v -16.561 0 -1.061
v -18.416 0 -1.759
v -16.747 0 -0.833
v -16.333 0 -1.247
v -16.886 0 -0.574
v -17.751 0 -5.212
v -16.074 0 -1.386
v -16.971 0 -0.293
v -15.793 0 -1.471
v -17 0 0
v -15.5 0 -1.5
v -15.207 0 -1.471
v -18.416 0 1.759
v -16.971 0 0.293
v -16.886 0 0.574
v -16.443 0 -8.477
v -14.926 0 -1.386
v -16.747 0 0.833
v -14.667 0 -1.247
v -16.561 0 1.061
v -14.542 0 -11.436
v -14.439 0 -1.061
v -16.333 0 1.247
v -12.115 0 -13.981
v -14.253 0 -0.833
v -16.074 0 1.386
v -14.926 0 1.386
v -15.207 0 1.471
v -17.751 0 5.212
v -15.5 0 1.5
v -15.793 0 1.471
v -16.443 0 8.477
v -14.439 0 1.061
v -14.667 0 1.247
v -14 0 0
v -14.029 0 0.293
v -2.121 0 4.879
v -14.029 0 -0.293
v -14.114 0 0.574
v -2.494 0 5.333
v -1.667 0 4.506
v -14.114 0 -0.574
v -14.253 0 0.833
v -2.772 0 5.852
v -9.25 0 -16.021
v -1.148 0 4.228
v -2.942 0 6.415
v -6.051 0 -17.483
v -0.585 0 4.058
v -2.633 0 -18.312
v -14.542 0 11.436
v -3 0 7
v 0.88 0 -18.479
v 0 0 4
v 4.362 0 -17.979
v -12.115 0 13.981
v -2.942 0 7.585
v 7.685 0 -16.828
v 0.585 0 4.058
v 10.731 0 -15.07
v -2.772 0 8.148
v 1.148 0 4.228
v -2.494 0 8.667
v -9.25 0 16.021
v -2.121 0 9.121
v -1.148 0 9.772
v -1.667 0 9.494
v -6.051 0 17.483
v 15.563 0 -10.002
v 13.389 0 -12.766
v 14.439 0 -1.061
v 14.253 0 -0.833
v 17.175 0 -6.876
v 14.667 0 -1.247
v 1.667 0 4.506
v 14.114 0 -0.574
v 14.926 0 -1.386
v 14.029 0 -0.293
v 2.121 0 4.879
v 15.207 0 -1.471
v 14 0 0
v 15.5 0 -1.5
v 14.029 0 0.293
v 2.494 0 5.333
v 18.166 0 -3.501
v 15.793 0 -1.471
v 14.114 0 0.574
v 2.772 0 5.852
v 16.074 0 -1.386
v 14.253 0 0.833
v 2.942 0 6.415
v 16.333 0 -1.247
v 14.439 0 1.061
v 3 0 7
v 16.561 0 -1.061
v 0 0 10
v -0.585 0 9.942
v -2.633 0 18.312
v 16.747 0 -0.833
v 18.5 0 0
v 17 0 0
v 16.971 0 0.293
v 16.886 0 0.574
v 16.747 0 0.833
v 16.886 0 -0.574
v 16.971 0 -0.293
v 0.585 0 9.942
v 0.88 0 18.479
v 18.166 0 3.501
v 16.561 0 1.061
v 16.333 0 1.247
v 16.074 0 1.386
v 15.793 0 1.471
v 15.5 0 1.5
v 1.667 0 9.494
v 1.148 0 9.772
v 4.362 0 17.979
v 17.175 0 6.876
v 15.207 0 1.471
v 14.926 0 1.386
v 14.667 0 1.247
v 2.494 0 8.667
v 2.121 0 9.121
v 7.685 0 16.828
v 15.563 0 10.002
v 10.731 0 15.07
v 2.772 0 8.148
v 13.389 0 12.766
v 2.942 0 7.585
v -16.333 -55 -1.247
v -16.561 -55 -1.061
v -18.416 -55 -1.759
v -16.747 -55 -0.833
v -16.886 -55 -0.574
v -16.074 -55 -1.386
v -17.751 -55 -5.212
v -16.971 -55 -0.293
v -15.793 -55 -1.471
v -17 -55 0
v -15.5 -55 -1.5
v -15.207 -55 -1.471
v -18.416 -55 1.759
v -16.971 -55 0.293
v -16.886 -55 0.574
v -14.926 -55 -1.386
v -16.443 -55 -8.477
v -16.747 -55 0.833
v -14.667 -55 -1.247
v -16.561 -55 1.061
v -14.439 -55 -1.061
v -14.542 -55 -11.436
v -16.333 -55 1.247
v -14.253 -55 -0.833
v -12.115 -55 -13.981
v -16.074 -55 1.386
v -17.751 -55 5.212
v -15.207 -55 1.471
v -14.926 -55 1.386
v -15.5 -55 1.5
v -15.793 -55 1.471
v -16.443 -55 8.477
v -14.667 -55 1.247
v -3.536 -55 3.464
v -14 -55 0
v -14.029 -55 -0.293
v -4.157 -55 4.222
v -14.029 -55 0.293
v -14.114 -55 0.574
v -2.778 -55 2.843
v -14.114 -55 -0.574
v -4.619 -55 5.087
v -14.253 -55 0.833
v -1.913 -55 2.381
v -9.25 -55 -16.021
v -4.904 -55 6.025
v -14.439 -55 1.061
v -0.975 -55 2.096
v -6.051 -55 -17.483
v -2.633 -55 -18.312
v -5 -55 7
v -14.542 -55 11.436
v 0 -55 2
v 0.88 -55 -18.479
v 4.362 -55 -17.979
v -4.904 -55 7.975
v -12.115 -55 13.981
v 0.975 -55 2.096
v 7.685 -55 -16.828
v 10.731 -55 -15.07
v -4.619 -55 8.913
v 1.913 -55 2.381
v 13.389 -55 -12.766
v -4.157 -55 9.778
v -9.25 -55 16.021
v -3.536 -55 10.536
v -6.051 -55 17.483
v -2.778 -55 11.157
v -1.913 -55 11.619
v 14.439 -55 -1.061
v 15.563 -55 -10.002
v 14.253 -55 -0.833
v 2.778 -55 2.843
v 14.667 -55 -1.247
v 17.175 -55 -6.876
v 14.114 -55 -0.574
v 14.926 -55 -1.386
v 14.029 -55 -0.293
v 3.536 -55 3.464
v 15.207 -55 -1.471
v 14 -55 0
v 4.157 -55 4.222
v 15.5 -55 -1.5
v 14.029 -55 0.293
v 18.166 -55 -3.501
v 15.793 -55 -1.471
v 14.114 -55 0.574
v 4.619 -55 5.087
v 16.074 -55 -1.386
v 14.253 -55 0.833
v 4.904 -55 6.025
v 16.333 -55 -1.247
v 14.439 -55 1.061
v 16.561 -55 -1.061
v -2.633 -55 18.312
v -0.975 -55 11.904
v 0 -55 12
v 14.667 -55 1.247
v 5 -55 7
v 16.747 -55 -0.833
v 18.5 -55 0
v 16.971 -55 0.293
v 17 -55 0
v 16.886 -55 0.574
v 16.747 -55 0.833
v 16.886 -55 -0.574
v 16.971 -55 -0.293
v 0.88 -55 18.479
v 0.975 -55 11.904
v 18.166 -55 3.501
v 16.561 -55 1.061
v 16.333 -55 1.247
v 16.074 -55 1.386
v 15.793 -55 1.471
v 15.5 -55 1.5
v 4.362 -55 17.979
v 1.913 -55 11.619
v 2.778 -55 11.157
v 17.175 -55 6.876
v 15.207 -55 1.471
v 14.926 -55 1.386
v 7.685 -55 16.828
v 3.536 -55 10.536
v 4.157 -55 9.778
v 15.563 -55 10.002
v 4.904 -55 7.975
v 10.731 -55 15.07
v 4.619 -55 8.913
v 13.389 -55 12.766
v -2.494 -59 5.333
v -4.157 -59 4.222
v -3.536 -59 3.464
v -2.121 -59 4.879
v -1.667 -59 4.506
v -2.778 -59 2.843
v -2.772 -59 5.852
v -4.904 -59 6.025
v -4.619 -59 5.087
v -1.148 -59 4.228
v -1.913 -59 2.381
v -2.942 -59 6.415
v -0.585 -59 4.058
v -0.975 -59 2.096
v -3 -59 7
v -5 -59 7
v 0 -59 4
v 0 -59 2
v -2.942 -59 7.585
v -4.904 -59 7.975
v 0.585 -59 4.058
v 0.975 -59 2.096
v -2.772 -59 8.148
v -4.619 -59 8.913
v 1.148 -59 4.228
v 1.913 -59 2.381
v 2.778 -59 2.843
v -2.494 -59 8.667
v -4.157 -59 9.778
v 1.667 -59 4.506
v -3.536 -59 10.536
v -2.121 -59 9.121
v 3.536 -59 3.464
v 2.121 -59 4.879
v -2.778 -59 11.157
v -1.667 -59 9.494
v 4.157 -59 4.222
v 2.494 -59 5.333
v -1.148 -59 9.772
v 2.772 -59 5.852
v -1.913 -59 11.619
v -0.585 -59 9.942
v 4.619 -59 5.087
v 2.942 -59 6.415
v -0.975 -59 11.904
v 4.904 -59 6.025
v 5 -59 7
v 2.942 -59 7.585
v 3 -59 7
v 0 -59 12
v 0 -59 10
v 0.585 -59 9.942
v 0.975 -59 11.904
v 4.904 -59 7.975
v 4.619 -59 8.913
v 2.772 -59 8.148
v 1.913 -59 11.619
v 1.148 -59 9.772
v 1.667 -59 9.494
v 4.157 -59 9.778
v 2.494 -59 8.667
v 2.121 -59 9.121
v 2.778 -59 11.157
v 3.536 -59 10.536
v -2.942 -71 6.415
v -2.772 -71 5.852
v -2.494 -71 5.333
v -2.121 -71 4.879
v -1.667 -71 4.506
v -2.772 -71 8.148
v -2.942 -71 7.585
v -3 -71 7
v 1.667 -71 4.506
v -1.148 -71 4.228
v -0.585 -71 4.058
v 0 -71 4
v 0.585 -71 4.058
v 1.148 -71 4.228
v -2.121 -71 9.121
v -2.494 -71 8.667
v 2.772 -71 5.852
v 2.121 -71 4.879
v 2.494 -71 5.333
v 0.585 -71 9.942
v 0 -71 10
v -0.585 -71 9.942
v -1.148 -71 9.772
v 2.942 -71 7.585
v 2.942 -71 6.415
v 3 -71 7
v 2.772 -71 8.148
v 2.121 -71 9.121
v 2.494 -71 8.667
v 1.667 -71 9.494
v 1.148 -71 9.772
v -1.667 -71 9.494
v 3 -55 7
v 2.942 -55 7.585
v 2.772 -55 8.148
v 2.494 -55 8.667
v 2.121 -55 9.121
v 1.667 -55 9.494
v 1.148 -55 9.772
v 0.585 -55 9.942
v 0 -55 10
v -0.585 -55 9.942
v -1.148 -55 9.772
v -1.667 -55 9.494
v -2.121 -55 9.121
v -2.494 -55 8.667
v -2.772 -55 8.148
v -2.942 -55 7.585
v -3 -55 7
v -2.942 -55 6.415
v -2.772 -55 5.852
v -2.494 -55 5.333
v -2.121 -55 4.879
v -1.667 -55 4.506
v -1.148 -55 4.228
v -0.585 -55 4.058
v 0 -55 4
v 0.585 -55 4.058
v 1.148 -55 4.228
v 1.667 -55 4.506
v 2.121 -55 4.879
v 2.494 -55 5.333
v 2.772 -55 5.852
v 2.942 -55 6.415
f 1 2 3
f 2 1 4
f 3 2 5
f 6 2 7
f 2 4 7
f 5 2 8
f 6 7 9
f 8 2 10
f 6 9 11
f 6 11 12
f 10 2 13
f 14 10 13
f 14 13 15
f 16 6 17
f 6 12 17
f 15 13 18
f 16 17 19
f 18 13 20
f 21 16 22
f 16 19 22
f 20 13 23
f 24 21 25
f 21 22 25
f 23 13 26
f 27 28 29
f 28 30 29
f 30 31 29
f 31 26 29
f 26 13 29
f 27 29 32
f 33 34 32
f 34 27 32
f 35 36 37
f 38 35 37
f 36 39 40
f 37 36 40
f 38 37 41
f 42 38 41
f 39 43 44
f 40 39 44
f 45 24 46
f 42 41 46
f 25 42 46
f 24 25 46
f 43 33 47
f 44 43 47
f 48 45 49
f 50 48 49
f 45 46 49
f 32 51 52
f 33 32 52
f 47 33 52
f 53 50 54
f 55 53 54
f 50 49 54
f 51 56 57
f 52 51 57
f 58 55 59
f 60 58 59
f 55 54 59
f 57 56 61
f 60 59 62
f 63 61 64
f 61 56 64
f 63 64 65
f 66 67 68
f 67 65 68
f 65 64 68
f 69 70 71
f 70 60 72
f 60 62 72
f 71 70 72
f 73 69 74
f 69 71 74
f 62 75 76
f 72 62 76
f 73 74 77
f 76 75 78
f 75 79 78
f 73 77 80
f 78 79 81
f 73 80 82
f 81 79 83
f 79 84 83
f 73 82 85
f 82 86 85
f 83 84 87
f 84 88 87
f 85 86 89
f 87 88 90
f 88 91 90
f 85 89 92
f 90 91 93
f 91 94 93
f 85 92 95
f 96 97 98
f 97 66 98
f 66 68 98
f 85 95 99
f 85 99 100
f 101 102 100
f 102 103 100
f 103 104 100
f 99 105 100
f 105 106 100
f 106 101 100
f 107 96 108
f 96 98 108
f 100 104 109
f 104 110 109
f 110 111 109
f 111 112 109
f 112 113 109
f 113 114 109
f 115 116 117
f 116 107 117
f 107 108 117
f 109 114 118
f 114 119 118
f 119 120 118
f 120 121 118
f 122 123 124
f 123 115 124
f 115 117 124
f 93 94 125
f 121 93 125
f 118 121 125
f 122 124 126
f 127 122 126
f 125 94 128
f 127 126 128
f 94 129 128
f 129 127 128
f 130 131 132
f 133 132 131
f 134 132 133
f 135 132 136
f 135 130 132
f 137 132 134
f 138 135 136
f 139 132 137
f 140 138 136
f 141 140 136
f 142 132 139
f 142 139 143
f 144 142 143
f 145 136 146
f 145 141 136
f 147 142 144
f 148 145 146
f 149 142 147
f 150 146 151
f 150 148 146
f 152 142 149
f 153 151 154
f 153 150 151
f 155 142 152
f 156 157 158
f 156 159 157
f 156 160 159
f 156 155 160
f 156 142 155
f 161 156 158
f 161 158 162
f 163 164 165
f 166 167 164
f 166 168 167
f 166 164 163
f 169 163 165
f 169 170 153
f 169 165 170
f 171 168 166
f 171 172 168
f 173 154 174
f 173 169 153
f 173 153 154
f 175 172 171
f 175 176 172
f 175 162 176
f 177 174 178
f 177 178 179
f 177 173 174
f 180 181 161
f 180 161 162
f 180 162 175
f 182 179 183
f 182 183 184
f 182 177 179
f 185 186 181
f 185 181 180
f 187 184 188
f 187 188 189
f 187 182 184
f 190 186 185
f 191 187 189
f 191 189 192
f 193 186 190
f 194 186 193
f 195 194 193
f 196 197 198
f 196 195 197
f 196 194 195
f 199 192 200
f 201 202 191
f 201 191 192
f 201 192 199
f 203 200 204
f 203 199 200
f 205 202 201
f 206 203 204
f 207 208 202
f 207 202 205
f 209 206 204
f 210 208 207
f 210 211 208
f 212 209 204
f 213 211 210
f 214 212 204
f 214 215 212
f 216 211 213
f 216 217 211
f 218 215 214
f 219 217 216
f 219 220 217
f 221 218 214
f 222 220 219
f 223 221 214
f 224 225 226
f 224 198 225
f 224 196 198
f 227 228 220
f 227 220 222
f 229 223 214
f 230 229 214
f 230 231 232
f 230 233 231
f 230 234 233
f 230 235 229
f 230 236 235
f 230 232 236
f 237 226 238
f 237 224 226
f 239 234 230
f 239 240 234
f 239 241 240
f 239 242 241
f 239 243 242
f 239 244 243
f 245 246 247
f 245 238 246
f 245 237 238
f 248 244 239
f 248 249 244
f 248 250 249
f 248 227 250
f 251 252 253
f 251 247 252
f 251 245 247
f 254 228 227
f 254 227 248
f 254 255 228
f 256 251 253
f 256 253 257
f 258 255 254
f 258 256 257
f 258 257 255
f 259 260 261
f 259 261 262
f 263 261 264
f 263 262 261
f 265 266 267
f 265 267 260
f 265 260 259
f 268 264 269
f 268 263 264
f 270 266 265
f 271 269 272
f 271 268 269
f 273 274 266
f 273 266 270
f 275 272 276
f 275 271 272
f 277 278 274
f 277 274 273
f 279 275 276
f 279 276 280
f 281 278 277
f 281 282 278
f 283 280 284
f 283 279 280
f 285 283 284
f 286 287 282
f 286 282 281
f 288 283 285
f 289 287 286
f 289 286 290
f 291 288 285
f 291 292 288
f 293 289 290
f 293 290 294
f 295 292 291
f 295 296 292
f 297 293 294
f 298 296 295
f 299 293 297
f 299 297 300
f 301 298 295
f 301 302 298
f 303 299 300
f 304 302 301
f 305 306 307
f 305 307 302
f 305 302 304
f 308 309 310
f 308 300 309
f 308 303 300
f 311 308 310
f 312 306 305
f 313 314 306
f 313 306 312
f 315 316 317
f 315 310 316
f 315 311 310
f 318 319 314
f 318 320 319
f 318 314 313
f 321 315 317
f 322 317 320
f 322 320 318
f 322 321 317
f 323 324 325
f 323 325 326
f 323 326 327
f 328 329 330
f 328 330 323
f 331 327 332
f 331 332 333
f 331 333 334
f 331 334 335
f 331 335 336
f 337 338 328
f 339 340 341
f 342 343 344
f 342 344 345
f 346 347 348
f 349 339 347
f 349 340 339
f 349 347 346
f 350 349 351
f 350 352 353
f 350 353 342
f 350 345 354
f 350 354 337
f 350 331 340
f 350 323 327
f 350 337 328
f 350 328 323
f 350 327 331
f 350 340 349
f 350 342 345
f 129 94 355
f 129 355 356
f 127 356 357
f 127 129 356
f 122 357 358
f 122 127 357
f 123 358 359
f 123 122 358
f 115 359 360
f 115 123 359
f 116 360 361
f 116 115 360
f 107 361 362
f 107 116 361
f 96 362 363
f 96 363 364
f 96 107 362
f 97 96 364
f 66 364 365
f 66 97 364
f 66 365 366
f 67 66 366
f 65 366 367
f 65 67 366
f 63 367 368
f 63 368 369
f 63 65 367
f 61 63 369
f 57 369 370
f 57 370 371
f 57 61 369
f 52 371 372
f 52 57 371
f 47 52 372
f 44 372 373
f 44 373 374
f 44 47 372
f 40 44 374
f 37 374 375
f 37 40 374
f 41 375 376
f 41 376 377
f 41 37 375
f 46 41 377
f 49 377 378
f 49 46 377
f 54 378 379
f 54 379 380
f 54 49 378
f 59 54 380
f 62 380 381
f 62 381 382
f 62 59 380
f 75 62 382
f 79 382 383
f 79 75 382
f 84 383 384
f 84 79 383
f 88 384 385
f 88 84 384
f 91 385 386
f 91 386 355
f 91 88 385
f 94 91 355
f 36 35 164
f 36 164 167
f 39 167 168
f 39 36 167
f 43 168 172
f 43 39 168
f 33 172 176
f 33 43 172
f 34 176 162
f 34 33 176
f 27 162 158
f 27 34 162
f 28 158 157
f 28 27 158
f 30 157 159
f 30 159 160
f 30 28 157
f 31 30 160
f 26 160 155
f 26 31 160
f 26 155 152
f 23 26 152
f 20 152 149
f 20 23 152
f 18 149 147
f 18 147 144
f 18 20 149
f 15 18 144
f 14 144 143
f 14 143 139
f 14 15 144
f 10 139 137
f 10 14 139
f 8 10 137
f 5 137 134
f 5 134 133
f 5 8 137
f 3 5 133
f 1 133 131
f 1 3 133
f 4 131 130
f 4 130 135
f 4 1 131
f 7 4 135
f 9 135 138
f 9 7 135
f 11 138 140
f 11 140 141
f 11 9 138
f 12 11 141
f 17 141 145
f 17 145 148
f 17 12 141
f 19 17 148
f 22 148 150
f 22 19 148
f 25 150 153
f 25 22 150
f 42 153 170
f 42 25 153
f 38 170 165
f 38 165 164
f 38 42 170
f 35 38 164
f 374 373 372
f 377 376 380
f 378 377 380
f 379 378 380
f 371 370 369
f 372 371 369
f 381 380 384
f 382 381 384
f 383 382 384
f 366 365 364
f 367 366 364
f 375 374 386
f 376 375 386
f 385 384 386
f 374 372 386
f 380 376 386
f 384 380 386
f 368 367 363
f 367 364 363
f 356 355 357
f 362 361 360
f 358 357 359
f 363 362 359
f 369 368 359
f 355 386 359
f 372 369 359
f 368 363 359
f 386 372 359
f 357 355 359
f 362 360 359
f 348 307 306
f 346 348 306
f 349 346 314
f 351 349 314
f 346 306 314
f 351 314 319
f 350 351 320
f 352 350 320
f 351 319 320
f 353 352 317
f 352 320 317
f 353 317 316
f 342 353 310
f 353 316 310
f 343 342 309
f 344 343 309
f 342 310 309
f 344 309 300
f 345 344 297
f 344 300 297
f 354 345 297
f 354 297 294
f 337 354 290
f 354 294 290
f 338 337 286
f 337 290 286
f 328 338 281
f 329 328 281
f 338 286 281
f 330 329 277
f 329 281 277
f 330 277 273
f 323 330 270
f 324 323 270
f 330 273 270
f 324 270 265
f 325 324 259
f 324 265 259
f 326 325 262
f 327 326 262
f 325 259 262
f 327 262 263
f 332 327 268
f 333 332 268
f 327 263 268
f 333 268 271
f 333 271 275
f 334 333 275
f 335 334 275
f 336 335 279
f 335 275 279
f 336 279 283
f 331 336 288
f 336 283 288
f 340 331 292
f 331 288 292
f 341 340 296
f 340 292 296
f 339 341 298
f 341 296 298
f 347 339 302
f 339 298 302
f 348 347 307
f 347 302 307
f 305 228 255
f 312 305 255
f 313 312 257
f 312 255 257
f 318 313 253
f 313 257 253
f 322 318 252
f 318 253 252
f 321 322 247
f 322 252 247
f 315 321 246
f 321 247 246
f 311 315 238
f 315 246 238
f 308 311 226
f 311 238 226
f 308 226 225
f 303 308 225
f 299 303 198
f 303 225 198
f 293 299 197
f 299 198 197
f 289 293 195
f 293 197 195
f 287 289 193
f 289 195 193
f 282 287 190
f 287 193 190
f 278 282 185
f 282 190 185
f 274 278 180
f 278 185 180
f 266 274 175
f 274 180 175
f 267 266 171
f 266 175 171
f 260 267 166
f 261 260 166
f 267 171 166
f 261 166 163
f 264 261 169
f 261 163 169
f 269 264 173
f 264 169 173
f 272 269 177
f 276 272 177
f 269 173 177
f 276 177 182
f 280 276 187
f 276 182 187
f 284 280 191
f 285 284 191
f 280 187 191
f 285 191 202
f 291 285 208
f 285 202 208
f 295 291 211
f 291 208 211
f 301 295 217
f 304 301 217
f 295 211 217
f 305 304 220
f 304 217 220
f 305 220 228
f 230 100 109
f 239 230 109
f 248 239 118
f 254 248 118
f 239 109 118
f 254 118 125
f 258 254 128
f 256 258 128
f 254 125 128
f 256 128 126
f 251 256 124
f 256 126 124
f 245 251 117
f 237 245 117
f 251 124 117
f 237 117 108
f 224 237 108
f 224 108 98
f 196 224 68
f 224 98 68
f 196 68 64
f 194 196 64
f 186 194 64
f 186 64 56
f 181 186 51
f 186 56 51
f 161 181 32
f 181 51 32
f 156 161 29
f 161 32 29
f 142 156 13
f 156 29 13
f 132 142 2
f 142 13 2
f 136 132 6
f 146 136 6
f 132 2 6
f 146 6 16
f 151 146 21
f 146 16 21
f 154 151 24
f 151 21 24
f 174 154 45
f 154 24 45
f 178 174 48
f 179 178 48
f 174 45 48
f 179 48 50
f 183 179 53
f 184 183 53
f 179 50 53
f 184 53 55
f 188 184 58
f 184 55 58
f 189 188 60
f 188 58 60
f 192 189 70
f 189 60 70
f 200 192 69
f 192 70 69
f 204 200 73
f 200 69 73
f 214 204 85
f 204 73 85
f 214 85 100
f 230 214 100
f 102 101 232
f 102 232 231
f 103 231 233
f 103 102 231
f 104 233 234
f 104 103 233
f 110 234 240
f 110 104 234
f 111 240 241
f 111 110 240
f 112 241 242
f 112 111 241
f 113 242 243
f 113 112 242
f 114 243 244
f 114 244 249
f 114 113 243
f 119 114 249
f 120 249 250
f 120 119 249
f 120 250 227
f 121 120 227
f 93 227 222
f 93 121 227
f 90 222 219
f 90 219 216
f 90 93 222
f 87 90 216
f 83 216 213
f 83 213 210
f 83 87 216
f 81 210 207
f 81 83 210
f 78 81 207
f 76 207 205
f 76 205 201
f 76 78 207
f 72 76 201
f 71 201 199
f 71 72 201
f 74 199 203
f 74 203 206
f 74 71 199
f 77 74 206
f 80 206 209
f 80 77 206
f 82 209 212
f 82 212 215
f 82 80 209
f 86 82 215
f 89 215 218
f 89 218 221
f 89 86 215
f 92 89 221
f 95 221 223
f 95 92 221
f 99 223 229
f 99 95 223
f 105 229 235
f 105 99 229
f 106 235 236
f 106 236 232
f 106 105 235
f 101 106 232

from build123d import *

# Parameters (mm, degrees)
F0_R     = 18.5
F0_R_2   = 1.5
F0_R_3   = 3
F1_DEPTH = 55
F2_R     = 5
F3_DEPTH = 4
F4_R     = 3
F5_DEPTH = 12


with BuildPart() as f1:
    # F0 (on Front) → F1 (new body)
    with BuildSketch(Plane.XZ):
        Circle(F0_R)
        with Locations((-15.5, 0)):
            Circle(F0_R_2, mode=Mode.SUBTRACT)
        with Locations((0, 7)):
            Circle(F0_R_3, mode=Mode.SUBTRACT)
        with Locations((15.5, 0)):
            Circle(F0_R_2, mode=Mode.SUBTRACT)
    extrude(amount=F1_DEPTH)

    # F2 (on face) → F3 (join)
    with BuildSketch(Plane.XZ.offset(55)):
        with Locations((0, 7)):
            Circle(F2_R)
    extrude(amount=F3_DEPTH)

    # F4 (on face) → F5 (join)
    with BuildSketch(Plane.XZ.offset(59)):
        with Locations((0, 7)):
            Circle(F4_R)
    extrude(amount=F5_DEPTH)


solid = f1.part
